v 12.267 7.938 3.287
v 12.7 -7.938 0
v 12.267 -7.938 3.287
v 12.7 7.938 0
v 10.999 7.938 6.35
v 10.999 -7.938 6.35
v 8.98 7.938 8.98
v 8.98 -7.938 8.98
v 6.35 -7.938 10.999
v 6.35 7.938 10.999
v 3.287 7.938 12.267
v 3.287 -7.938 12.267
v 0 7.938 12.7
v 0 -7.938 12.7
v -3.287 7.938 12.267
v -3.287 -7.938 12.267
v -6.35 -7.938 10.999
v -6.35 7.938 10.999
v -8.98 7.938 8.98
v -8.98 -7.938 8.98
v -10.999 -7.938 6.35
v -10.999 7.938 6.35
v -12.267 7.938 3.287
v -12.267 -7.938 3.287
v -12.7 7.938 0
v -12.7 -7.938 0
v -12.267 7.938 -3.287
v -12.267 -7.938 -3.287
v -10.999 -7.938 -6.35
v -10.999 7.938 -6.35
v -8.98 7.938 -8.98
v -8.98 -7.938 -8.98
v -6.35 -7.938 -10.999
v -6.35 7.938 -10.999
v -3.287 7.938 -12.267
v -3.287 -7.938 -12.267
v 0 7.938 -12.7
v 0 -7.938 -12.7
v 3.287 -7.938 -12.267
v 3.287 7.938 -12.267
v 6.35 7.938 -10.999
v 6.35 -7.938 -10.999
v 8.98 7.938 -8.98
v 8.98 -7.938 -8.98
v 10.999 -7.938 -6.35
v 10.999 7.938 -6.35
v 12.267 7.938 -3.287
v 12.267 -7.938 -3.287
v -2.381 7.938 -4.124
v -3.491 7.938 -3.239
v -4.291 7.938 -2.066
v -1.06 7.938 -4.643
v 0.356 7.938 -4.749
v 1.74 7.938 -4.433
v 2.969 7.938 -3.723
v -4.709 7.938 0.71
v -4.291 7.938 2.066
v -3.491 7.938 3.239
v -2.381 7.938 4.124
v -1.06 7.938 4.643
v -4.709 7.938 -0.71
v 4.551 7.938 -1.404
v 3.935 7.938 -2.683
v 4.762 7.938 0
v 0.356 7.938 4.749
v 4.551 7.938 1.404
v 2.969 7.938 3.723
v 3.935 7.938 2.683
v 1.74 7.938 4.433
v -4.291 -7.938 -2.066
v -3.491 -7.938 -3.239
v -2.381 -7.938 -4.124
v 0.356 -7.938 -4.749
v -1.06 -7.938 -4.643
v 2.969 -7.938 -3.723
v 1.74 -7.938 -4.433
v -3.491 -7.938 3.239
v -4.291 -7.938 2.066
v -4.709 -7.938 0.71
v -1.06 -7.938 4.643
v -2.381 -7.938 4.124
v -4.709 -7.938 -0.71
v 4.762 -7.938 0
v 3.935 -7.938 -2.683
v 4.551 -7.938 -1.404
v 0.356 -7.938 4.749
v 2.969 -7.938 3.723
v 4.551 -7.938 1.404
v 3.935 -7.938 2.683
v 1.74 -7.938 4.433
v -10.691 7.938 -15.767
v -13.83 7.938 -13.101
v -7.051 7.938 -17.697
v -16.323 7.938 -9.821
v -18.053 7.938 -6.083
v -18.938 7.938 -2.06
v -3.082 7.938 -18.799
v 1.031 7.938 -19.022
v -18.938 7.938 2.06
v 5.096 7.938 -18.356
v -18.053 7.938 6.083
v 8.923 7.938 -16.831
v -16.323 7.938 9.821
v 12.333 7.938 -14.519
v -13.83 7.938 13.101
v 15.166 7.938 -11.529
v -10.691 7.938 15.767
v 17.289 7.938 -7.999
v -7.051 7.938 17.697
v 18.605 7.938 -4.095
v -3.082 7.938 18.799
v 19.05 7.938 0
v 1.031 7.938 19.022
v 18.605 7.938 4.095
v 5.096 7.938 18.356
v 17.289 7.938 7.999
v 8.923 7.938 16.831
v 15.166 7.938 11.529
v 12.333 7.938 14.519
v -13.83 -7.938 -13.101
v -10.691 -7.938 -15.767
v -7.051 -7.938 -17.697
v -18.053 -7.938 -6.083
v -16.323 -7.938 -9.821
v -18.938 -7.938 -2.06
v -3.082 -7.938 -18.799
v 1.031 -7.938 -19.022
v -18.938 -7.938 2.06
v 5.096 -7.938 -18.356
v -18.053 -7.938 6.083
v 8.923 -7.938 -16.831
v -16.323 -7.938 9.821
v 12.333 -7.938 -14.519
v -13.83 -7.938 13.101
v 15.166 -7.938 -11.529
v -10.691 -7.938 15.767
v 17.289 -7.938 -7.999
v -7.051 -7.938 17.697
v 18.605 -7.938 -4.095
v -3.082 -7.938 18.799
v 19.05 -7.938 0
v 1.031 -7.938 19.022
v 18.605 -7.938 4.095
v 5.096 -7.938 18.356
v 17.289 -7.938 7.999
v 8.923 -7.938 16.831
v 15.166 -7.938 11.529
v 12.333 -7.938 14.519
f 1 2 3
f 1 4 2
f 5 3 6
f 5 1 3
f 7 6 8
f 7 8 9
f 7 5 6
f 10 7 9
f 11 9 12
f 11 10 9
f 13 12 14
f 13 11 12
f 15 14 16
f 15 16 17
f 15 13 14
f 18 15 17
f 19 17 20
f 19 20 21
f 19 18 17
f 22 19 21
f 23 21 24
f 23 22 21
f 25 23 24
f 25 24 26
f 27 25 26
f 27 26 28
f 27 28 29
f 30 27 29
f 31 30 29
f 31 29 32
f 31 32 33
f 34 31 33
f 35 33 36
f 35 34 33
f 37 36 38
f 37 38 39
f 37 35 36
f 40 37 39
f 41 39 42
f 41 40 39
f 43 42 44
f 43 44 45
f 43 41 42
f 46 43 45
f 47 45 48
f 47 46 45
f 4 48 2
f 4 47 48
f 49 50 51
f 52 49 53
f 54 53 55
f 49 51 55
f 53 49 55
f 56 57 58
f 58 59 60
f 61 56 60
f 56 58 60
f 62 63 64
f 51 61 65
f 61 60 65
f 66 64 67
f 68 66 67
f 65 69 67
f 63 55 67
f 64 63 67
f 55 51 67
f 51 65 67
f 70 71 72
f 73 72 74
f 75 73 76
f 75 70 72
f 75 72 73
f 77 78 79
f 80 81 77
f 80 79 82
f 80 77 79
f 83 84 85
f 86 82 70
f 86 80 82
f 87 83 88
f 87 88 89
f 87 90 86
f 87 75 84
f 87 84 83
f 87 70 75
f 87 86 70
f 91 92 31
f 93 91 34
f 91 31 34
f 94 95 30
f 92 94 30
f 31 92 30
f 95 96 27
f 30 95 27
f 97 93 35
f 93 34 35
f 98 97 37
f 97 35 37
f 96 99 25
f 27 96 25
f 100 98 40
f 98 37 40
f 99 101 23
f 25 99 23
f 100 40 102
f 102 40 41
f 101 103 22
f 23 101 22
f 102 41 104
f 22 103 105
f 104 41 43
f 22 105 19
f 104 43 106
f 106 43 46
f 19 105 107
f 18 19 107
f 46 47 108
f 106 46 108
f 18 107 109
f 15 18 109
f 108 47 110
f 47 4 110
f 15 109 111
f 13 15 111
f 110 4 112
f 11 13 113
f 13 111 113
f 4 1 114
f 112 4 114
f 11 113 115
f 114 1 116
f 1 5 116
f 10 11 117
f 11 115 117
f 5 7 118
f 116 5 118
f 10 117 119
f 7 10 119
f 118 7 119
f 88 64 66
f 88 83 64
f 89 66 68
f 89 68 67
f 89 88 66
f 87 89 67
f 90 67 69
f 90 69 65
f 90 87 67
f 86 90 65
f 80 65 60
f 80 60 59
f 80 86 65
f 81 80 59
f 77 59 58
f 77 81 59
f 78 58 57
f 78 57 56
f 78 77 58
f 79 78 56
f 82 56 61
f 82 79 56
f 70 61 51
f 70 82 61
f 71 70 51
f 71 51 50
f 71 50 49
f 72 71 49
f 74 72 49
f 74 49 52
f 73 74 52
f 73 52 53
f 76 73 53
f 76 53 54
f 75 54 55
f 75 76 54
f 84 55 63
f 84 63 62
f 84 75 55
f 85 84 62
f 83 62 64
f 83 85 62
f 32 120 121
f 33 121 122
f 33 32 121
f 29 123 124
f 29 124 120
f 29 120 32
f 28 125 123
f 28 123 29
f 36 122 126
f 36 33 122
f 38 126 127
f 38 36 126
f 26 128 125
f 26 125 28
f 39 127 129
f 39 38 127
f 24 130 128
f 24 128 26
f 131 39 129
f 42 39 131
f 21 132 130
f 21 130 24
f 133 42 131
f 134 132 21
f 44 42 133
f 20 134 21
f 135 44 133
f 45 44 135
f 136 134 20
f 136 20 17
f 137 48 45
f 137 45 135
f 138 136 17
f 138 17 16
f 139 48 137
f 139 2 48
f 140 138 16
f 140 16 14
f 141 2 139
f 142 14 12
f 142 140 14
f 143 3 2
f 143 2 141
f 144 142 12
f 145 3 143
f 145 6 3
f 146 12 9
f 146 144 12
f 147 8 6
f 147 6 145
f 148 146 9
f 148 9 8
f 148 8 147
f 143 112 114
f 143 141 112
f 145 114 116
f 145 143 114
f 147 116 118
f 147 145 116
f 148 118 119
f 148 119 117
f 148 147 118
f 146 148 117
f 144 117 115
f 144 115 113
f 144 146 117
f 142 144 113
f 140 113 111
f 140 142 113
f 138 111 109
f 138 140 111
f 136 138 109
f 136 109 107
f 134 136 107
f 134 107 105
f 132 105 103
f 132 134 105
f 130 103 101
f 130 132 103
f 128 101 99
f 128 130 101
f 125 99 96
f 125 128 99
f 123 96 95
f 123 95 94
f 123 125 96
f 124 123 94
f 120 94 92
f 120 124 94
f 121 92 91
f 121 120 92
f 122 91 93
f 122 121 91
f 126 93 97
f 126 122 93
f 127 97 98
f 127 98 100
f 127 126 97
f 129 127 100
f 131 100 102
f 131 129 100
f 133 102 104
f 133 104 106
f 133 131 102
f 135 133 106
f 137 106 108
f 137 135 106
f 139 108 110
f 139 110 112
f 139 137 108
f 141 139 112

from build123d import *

# Parameters (mm, degrees)
F0_R     = 19.05
F0_R_2   = 12.7
F1_DEPTH = 7.9375
F0_R_3   = 4.7625


# Not quite as in the source:
# - a length typed as a fraction of an inch, garbled in the dataset ("3 / 203.2 mm" for 3/8 in), is restored


with BuildPart() as f1:
    # F0 (on Front) → F1 (new body, symmetric)
    with BuildSketch(Plane.XZ):
        Circle(F0_R)
        Circle(F0_R_2, mode=Mode.SUBTRACT)
    extrude(amount=F1_DEPTH, both=True)


with BuildPart() as f1b:
    # F0 (on Front) → F1, piece 2 (new body, symmetric)
    with BuildSketch(Plane.XZ):
        Circle(F0_R_3)
    extrude(amount=F1_DEPTH, both=True)


solid = Compound([f1.part, f1b.part])
